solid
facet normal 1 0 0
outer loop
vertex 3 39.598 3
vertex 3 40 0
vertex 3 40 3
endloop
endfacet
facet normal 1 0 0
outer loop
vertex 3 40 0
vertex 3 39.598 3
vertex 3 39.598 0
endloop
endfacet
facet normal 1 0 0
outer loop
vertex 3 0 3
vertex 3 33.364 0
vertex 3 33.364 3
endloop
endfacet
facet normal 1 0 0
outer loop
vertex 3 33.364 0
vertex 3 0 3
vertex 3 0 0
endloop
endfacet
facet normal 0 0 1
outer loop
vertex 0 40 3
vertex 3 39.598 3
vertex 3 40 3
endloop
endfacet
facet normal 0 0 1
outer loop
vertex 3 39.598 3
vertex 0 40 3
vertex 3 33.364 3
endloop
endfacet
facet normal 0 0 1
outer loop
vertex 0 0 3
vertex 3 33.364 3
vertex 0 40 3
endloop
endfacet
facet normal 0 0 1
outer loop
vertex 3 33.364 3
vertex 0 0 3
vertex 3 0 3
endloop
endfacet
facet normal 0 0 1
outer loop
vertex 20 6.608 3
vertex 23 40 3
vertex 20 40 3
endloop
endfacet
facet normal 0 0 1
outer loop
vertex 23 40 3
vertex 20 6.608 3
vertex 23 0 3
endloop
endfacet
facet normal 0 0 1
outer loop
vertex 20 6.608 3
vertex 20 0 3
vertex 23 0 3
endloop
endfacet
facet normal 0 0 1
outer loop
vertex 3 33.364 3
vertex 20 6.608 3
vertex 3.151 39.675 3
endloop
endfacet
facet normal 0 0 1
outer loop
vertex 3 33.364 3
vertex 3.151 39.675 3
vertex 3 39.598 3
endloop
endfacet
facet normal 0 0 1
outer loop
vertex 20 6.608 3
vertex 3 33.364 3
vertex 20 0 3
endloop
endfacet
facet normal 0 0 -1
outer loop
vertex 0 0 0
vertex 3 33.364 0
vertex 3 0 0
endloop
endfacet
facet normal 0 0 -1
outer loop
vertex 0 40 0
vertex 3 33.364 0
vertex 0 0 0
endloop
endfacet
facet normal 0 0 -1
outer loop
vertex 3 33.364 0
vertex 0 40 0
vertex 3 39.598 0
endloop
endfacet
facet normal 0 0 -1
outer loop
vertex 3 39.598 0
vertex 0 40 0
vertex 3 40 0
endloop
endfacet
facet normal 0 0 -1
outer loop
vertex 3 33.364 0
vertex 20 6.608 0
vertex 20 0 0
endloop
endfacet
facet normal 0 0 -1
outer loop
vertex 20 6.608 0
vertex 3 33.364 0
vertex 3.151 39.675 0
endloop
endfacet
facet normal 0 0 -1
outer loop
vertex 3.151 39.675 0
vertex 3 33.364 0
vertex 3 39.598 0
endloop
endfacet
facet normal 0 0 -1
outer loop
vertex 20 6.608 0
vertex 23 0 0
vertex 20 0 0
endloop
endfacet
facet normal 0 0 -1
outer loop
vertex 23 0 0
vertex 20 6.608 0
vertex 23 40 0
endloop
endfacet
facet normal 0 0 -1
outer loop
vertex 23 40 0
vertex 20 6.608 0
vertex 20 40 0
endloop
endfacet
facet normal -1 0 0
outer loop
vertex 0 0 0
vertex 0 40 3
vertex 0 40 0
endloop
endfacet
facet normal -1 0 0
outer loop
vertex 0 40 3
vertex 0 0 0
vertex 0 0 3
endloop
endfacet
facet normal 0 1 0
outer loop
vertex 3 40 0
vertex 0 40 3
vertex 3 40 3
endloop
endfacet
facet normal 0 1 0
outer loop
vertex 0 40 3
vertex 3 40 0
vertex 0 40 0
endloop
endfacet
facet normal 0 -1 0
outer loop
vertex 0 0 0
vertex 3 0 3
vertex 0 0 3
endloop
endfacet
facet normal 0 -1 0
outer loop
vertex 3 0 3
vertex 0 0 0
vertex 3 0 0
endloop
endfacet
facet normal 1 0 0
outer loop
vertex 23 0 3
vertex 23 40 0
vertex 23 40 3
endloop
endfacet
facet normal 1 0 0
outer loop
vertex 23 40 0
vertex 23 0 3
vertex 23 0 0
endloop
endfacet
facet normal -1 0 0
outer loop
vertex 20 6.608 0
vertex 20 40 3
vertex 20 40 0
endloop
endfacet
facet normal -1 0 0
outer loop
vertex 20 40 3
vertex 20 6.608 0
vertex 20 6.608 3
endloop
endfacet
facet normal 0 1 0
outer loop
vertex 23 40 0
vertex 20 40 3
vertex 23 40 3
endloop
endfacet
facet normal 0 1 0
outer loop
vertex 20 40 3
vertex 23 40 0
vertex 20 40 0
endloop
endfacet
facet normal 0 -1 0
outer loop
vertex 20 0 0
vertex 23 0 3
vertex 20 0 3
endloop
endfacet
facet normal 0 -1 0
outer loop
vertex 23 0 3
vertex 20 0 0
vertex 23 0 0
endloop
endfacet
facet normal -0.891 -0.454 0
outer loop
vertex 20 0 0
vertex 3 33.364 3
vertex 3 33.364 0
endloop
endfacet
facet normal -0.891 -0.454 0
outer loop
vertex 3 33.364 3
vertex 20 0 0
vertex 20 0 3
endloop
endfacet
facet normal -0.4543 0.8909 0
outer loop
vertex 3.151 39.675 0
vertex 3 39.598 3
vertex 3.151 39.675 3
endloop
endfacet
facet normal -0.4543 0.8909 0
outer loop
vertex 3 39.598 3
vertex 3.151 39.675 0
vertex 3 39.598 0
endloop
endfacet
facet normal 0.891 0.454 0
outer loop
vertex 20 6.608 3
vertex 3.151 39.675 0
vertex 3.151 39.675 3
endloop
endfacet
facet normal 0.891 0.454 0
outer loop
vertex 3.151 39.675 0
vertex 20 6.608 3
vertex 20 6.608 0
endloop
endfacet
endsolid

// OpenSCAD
union(){
 cube([3,40,3]);
 translate([20,0,0,]) cube([3,40,3]);
 translate([20,0,0]) rotate([0,0,27]) cube([3,43,3]);
}
